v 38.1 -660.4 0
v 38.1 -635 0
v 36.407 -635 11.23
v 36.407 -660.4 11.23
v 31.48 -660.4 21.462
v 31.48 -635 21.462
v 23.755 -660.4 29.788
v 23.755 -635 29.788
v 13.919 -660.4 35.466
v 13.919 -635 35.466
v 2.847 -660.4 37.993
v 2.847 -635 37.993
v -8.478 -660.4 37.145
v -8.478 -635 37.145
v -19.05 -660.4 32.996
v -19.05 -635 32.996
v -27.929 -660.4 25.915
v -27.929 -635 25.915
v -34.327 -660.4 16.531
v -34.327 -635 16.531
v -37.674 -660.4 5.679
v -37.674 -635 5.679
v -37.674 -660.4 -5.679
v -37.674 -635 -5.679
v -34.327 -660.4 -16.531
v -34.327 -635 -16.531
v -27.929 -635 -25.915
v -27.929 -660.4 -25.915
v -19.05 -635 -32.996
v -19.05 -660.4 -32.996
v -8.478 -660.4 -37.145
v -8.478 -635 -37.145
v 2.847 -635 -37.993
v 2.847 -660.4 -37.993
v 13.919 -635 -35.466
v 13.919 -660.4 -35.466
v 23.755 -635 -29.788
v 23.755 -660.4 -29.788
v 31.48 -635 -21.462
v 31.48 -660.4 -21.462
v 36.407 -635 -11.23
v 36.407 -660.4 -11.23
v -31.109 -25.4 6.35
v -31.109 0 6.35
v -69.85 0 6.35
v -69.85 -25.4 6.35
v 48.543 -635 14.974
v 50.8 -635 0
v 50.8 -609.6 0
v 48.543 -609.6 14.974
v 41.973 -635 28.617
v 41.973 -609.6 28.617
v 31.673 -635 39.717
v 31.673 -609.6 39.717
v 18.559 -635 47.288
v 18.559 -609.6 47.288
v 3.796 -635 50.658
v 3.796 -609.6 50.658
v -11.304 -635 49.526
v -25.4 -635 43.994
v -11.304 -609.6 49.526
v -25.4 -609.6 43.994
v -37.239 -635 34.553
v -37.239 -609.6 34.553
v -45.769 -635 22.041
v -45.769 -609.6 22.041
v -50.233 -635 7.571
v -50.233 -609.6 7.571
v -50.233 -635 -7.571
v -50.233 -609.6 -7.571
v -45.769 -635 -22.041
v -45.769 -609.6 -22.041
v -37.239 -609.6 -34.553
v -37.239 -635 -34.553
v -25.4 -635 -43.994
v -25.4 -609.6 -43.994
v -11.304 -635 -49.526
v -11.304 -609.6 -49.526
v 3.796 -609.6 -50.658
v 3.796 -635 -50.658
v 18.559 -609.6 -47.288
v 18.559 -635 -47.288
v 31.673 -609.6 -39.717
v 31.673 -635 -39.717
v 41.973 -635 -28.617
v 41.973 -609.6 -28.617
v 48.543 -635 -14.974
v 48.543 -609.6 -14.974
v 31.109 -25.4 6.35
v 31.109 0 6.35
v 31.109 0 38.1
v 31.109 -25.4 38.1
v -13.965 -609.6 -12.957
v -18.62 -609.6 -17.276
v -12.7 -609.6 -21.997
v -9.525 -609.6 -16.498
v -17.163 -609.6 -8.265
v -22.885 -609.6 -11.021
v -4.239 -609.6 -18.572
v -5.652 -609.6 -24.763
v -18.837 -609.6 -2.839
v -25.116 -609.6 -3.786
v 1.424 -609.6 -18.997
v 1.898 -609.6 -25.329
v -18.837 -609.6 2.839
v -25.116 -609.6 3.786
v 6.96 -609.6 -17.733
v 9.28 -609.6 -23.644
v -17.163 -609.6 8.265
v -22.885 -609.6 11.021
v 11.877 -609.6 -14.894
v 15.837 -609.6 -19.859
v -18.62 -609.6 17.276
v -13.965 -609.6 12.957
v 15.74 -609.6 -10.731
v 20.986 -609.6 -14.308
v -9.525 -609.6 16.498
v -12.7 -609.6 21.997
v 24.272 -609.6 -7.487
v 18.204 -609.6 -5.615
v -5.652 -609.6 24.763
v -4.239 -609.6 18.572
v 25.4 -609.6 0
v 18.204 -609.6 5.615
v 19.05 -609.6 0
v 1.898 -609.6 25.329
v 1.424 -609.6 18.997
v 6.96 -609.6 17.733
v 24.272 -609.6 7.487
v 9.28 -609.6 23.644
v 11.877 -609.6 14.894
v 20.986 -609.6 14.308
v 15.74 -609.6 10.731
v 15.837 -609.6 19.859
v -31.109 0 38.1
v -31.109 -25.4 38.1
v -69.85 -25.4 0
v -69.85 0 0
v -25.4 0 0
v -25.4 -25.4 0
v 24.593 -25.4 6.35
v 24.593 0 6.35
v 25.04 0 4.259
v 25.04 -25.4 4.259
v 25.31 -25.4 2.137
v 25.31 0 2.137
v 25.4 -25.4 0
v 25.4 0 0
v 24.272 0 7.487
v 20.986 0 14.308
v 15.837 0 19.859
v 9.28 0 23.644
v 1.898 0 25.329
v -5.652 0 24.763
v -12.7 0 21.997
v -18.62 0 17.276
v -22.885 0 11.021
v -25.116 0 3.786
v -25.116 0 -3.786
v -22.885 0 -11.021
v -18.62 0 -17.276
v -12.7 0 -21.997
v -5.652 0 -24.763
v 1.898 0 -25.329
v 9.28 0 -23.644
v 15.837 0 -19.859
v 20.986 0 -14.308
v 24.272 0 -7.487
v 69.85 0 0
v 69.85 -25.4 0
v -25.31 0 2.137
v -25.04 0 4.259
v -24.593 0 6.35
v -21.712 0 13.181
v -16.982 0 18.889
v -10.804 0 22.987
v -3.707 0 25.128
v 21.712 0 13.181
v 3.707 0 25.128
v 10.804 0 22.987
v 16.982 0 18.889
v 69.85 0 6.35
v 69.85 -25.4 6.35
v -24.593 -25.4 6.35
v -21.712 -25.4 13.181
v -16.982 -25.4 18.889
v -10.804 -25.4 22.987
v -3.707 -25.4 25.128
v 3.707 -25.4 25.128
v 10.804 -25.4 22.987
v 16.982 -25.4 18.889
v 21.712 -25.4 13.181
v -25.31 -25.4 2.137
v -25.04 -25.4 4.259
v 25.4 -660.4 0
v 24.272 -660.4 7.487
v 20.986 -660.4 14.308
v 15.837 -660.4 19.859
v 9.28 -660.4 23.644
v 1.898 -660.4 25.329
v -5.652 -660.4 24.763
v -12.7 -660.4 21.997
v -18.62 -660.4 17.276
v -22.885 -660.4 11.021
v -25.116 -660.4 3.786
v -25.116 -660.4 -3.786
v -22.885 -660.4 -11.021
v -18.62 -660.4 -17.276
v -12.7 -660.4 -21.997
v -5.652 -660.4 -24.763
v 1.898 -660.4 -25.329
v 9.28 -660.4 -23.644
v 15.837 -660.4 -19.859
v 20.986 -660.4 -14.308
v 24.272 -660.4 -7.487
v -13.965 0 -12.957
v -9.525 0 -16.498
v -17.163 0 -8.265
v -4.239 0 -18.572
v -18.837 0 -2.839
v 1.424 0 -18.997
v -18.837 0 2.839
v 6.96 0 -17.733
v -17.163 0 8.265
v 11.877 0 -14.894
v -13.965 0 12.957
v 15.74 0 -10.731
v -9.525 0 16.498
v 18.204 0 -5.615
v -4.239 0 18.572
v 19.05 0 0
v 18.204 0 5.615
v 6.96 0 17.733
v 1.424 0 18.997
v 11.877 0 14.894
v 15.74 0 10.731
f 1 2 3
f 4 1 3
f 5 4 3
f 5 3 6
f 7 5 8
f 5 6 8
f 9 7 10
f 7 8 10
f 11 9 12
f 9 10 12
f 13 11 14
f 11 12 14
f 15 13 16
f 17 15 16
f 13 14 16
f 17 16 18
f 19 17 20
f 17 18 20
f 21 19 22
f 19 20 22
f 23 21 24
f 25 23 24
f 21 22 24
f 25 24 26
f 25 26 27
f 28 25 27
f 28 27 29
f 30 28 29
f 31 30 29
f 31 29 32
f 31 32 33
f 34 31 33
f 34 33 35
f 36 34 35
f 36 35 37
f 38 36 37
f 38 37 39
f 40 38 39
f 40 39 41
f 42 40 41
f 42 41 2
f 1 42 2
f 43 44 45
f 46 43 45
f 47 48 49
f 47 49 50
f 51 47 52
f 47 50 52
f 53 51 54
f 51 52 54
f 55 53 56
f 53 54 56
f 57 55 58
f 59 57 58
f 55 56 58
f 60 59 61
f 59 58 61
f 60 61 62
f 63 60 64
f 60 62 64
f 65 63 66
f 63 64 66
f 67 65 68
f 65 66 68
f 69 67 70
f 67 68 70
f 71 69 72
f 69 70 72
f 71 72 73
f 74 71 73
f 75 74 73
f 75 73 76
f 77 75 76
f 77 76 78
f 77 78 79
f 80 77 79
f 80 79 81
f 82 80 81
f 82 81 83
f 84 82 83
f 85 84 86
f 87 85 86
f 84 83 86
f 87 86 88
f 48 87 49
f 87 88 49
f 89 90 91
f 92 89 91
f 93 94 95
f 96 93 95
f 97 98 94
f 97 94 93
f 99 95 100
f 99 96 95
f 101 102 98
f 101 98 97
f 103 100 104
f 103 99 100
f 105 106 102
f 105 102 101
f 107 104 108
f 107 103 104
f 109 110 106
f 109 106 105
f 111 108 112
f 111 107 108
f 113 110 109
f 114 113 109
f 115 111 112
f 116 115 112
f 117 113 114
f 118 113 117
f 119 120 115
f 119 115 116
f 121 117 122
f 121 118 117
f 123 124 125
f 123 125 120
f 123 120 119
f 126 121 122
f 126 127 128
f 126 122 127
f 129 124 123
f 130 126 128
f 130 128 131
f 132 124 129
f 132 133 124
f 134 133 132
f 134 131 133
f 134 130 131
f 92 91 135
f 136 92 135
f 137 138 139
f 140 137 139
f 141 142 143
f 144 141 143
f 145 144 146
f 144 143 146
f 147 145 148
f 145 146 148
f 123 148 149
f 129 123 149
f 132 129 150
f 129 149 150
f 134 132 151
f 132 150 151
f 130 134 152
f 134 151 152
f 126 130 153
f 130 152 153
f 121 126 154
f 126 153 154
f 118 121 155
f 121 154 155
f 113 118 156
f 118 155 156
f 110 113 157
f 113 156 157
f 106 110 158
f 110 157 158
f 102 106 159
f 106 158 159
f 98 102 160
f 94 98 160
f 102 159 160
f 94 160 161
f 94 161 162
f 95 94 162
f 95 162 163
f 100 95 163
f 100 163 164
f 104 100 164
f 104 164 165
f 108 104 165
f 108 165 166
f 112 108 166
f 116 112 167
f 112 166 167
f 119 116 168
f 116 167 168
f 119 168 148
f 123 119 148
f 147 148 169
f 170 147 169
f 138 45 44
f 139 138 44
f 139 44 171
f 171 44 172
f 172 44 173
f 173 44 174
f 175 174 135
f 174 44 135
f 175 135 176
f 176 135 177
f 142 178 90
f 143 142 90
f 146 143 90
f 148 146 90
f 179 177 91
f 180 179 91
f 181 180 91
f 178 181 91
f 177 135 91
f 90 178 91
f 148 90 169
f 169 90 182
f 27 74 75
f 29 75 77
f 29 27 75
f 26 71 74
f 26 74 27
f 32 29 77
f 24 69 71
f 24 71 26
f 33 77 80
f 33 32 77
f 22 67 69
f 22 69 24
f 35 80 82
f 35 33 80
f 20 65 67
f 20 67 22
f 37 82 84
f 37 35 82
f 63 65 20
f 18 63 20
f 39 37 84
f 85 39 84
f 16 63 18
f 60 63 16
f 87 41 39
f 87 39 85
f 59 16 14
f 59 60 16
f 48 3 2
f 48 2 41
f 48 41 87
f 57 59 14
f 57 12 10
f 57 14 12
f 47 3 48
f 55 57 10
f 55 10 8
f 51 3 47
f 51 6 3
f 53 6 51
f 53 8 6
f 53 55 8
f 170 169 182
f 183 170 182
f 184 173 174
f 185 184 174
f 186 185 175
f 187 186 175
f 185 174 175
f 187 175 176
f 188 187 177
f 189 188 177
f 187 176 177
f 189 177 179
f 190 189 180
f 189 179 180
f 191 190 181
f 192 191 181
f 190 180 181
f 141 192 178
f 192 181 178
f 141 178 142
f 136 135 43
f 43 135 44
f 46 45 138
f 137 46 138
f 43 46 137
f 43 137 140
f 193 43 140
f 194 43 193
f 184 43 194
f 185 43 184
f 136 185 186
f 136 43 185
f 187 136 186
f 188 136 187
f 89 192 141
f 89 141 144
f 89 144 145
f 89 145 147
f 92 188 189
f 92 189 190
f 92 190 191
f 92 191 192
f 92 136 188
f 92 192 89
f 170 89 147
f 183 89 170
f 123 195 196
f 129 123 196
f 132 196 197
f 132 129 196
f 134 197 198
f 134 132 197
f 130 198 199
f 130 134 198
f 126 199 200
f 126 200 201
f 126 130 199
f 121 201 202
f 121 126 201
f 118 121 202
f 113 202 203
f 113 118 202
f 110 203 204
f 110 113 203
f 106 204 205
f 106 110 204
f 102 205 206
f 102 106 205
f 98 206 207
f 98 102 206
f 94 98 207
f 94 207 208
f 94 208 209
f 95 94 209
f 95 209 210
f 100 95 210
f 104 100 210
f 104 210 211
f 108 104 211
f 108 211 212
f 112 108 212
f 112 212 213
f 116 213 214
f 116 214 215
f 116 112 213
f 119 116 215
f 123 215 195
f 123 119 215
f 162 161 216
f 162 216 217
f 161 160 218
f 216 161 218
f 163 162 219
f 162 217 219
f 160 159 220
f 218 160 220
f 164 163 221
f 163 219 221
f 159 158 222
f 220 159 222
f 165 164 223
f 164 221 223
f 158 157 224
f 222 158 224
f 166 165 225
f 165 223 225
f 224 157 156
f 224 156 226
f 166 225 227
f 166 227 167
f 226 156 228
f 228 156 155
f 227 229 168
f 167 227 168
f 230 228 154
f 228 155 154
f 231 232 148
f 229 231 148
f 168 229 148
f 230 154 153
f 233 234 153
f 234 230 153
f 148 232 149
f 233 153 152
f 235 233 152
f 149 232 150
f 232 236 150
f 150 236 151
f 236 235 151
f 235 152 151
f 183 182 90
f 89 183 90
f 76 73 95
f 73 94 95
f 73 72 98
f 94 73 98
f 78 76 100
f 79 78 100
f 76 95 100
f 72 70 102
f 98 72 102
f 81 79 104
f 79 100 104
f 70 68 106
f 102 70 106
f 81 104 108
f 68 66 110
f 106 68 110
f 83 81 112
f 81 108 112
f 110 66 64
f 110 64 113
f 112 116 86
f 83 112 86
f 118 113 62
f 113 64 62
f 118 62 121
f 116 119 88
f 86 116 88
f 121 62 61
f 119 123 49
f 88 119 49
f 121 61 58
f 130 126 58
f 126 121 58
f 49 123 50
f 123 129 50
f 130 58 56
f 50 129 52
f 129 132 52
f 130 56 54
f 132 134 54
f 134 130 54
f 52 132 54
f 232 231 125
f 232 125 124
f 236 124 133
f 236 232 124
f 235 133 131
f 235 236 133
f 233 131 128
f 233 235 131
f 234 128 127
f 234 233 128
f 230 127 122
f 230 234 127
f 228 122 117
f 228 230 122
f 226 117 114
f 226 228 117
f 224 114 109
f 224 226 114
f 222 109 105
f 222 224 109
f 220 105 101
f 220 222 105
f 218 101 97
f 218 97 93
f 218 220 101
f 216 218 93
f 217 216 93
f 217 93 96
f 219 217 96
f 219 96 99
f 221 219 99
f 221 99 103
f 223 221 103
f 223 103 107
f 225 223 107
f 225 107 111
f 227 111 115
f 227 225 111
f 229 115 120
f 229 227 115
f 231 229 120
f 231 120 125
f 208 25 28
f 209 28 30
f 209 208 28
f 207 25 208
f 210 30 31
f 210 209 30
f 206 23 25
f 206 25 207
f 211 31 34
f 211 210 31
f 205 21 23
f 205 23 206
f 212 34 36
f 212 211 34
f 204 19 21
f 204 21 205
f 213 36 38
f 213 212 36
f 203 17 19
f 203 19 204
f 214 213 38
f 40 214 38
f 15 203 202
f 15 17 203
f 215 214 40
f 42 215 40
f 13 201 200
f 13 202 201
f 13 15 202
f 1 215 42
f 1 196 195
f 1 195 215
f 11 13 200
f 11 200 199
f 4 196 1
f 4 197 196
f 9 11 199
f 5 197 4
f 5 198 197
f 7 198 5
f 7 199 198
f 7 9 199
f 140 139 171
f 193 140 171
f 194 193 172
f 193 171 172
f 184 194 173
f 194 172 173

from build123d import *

# Parameters (mm, degrees)
F0_R     = 25.4
F0_R_2   = 19.05
F1_DEPTH = 609.6
F3_DEPTH = 25.4
F5_DEPTH = 25.4
F6_R     = 50.8
F6_R_2   = 38.1
F7_DEPTH = 25.4
F6_R_3   = 25.4
F8_DEPTH = 50.8


with BuildPart() as f1:
    # F0 (on Front) → F1 (new body)
    with BuildSketch(Plane.XZ):
        Circle(F0_R)
        Circle(F0_R_2, mode=Mode.SUBTRACT)
    extrude(amount=F1_DEPTH)



with BuildPart() as f3:
    # F2 (on Front) → F3 (new body)
    with BuildSketch(Plane.XZ):
        with BuildLine():
            ThreePointArc((-24.5934442484, 6.35), (0, 25.4), (24.5934442484, 6.35))
            Line((24.5934442484, 6.35), (31.1085197333, 6.35))
            ThreePointArc((31.1085197333, 6.35), (0, 31.75), (-31.1085197333, 6.35))
            Line((-31.1085197333, 6.35), (-24.5934442484, 6.35))
        make_face()
        with BuildLine():
            ThreePointArc((31.1085197333, 6.35), (31.5892228579, 3.1911595437), (31.75, 0))
            Line((31.75, 0), (69.85, 0))
            Line((69.85, 0), (69.85, 6.35))
            Line((69.85, 6.35), (31.1085197333, 6.35))
        make_face()
        with BuildLine():
            ThreePointArc((24.5934442484, 6.35), (25.1975542852, 3.2005090291), (25.4, 0))
            Line((25.4, 0), (31.75, 0))
            ThreePointArc((31.75, 0), (31.5892228579, 3.1911595437), (31.1085197333, 6.35))
            Line((31.1085197333, 6.35), (24.5934442484, 6.35))
        make_face()
        with BuildLine():
            Line((-31.75, 0), (-25.4, 0))
            ThreePointArc((-25.4, 0), (-25.1975542852, 3.2005090291), (-24.5934442484, 6.35))
            Line((-24.5934442484, 6.35), (-31.1085197333, 6.35))
            ThreePointArc((-31.1085197333, 6.35), (-31.5892228579, 3.1911595437), (-31.75, 0))
        make_face()
        with BuildLine():
            Line((-69.85, 0), (-31.75, 0))
            ThreePointArc((-31.75, 0), (-31.5892228579, 3.1911595437), (-31.1085197333, 6.35))
            Line((-31.1085197333, 6.35), (-69.85, 6.35))
            Line((-69.85, 6.35), (-69.85, 0))
        make_face()
    extrude(amount=F3_DEPTH)

    # F4 (on Front) → F5 (join)
    with BuildSketch(Plane.XZ):
        Polygon((-31.1085197333, 31.75), (-2.84e-08, 31.75), (31.1085197333, 31.75), (31.1085197333, 38.1), (-31.1085197333, 38.1), align=None)
        with BuildLine():
            ThreePointArc((-2.84e-08, 31.75), (20.0804631311, 24.5934442574), (31.1085197333, 6.35))
            Line((31.1085197333, 6.35), (31.1085197333, 31.75))
            Line((31.1085197333, 31.75), (-2.84e-08, 31.75))
        make_face()
        with BuildLine():
            ThreePointArc((-31.1085197333, 6.35), (-20.0804631531, 24.5934442394), (-2.84e-08, 31.75))
            Line((-2.84e-08, 31.75), (-31.1085197333, 31.75))
            Line((-31.1085197333, 31.75), (-31.1085197333, 6.35))
        make_face()
    extrude(amount=F5_DEPTH)


with BuildPart() as f7:
    # F6 (on face) → F7 (new body)
    with BuildSketch(Plane.XZ.offset(609.6)):
        Circle(F6_R)
        Circle(F6_R_2, mode=Mode.SUBTRACT)
    extrude(amount=F7_DEPTH)


with BuildPart() as f1_1:
    add(f1.part)

    add(f7.part)  # F8 merges F7
    # F6 (on face) → F8 (join)
    with BuildSketch(Plane.XZ.offset(609.6)):
        Circle(F6_R_2)
        Circle(F6_R_3, mode=Mode.SUBTRACT)
    extrude(amount=F8_DEPTH)


solid = Compound([f3.part, f1_1.part])
